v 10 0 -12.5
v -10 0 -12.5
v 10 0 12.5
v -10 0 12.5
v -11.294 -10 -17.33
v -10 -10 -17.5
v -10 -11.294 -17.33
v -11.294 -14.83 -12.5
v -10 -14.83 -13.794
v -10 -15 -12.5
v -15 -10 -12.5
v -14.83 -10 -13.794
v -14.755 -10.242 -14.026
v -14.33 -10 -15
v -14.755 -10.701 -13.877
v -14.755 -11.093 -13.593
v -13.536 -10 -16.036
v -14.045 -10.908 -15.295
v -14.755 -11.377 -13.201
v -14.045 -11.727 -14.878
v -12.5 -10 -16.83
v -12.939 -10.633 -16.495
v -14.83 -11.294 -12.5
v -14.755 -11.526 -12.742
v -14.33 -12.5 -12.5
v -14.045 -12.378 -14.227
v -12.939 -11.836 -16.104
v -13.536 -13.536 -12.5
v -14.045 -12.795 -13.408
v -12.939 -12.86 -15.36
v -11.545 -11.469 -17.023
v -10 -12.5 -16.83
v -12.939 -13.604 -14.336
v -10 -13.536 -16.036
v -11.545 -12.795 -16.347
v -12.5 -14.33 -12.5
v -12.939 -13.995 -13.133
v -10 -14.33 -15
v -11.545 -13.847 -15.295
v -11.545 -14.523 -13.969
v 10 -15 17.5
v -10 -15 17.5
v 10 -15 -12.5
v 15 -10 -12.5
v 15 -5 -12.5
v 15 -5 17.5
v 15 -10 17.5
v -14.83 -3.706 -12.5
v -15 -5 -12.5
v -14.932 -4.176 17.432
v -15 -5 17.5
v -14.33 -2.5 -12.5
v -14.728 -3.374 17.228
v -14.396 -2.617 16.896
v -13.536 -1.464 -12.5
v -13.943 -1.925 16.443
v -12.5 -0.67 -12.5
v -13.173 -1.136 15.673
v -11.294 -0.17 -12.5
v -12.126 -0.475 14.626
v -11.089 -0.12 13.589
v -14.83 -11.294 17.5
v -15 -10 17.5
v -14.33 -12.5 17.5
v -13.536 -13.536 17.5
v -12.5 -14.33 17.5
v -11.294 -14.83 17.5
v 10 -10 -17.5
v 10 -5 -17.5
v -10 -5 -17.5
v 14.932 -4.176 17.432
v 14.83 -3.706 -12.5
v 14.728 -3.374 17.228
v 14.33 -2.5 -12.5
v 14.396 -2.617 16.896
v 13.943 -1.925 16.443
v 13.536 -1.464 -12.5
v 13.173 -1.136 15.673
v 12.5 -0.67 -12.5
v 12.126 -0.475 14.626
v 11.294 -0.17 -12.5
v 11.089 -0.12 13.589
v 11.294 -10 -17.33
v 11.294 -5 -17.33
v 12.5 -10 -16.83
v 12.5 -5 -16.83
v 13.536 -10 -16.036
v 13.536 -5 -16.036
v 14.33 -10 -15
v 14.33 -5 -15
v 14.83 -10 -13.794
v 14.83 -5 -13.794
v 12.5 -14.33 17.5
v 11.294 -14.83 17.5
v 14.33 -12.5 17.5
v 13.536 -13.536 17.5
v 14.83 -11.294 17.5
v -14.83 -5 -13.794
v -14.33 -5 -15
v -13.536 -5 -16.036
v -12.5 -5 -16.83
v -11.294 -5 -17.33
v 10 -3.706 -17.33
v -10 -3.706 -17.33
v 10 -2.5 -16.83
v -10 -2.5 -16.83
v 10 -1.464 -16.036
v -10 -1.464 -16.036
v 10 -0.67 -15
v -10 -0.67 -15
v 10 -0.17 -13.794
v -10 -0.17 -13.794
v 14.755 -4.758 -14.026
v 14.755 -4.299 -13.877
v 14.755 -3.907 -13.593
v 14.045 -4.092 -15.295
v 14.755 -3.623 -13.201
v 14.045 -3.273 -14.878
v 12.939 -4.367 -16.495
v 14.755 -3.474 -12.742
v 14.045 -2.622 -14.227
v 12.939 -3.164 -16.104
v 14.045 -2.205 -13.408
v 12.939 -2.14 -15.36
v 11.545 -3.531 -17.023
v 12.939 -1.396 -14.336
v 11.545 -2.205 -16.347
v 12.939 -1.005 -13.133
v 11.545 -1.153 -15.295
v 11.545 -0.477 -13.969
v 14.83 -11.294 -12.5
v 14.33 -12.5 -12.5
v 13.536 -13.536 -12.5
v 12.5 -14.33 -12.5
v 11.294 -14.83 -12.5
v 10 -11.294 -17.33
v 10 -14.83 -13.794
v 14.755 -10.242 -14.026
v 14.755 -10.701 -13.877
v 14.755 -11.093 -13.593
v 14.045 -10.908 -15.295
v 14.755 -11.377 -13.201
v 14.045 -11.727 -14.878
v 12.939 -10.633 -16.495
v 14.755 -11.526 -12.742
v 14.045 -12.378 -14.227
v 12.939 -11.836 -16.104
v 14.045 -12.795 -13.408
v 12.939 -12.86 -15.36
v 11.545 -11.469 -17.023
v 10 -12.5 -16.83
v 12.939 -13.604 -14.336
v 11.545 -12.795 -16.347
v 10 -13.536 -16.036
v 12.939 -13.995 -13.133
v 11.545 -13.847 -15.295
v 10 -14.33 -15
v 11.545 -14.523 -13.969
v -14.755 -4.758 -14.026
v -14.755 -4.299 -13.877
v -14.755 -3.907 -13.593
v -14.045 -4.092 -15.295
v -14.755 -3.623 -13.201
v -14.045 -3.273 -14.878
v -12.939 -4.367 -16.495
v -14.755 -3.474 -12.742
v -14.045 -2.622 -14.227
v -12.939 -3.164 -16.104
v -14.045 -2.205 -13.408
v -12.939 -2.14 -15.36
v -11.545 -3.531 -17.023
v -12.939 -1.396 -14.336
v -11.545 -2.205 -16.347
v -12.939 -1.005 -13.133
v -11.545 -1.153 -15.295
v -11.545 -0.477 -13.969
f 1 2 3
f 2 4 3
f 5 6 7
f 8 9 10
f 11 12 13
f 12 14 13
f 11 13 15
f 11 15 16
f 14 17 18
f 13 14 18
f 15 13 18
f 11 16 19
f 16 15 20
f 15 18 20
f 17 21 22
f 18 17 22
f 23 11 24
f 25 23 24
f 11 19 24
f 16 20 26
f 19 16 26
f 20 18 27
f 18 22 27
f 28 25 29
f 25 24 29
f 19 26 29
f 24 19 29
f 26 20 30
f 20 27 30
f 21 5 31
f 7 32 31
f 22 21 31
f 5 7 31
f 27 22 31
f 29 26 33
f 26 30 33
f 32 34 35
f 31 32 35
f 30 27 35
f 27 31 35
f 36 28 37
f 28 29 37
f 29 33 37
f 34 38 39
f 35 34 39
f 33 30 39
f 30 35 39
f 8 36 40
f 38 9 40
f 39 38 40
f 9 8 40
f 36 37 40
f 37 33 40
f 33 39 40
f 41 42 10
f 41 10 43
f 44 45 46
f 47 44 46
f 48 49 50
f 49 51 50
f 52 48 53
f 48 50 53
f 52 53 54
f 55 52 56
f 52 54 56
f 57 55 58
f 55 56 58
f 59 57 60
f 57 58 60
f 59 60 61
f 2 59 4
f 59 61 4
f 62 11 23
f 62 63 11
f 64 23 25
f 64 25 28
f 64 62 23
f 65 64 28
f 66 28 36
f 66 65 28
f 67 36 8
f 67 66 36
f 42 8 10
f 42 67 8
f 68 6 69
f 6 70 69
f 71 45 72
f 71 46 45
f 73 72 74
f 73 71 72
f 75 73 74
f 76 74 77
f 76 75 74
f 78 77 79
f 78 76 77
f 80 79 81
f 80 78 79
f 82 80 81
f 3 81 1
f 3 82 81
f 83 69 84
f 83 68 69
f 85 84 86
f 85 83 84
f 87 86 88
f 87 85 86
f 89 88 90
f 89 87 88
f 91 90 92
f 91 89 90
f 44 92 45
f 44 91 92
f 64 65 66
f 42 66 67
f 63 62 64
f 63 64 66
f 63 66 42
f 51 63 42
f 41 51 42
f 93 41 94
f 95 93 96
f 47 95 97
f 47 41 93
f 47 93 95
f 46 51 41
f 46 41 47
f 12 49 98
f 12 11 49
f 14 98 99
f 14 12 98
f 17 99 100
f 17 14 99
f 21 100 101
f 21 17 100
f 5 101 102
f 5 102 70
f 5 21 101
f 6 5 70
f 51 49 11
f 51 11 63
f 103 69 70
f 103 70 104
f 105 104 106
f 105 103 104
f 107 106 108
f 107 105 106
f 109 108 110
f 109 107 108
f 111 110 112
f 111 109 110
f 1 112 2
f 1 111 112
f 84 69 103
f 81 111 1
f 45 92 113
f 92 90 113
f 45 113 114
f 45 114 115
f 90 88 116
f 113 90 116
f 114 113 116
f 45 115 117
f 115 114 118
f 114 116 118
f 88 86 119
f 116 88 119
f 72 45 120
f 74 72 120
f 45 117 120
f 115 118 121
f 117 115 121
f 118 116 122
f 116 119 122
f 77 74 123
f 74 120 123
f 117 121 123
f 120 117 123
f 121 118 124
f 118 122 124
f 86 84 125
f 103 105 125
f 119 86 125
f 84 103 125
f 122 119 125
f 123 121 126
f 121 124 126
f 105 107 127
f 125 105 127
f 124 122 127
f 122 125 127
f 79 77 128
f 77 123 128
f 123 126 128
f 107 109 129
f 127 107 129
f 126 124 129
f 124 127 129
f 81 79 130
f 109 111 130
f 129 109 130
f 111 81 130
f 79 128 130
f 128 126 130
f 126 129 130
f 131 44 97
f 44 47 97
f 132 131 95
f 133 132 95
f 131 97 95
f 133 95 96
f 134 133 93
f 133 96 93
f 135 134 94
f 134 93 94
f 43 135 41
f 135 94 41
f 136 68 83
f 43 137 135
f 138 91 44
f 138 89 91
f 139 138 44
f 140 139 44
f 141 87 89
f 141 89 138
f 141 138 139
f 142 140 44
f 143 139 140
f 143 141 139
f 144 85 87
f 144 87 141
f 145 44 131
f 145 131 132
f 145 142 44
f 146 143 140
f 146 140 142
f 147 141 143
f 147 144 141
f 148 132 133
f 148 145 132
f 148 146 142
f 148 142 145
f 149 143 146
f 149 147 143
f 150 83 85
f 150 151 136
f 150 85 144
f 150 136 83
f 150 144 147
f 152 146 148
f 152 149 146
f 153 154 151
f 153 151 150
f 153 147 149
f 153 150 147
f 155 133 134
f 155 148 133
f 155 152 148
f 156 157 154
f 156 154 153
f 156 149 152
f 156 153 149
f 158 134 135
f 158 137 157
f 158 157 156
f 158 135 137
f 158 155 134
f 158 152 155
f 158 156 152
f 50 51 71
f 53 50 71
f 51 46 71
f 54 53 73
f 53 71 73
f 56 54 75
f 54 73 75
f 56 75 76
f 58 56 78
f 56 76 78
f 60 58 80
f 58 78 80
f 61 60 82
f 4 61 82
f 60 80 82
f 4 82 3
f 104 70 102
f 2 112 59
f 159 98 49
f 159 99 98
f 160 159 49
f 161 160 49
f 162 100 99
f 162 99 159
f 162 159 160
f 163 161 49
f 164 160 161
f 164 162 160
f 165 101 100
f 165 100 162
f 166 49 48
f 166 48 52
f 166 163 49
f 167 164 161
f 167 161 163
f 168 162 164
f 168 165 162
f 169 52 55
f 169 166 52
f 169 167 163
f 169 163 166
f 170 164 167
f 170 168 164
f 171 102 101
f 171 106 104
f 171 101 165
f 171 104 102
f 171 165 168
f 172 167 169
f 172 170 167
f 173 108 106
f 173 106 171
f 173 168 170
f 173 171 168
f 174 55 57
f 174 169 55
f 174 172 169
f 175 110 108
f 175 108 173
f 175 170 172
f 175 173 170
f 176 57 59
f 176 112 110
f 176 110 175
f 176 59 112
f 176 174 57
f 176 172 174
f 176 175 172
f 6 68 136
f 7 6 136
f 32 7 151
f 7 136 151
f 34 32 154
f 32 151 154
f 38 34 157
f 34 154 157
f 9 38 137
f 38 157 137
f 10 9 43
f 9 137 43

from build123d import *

# Parameters (mm, degrees)
F0_W     = 30
F0_H     = 35
F1_DEPTH = 15
F2_R     = 5


with BuildPart() as f1:
    # F0 (on Front) → F1 (new body)
    with BuildSketch(Plane.XZ):
        Rectangle(F0_W, F0_H)
    extrude(amount=F1_DEPTH)

    # F2
    f2_edges = [f1.edges().sort_by_distance(p)[0] for p in [
        (0, -15, -17.5),
        (0, 0, -17.5),
        (-15, -7.5, -17.5),
        (15, -7.5, -17.5),
        (15, -15, 0),
        (-15, -15, 0),
        (15, 0, 0),
        (0, 0, 17.5),
        (-15, 0, 0),
    ]]
    fillet(f2_edges, radius=F2_R)


solid = f1.part
